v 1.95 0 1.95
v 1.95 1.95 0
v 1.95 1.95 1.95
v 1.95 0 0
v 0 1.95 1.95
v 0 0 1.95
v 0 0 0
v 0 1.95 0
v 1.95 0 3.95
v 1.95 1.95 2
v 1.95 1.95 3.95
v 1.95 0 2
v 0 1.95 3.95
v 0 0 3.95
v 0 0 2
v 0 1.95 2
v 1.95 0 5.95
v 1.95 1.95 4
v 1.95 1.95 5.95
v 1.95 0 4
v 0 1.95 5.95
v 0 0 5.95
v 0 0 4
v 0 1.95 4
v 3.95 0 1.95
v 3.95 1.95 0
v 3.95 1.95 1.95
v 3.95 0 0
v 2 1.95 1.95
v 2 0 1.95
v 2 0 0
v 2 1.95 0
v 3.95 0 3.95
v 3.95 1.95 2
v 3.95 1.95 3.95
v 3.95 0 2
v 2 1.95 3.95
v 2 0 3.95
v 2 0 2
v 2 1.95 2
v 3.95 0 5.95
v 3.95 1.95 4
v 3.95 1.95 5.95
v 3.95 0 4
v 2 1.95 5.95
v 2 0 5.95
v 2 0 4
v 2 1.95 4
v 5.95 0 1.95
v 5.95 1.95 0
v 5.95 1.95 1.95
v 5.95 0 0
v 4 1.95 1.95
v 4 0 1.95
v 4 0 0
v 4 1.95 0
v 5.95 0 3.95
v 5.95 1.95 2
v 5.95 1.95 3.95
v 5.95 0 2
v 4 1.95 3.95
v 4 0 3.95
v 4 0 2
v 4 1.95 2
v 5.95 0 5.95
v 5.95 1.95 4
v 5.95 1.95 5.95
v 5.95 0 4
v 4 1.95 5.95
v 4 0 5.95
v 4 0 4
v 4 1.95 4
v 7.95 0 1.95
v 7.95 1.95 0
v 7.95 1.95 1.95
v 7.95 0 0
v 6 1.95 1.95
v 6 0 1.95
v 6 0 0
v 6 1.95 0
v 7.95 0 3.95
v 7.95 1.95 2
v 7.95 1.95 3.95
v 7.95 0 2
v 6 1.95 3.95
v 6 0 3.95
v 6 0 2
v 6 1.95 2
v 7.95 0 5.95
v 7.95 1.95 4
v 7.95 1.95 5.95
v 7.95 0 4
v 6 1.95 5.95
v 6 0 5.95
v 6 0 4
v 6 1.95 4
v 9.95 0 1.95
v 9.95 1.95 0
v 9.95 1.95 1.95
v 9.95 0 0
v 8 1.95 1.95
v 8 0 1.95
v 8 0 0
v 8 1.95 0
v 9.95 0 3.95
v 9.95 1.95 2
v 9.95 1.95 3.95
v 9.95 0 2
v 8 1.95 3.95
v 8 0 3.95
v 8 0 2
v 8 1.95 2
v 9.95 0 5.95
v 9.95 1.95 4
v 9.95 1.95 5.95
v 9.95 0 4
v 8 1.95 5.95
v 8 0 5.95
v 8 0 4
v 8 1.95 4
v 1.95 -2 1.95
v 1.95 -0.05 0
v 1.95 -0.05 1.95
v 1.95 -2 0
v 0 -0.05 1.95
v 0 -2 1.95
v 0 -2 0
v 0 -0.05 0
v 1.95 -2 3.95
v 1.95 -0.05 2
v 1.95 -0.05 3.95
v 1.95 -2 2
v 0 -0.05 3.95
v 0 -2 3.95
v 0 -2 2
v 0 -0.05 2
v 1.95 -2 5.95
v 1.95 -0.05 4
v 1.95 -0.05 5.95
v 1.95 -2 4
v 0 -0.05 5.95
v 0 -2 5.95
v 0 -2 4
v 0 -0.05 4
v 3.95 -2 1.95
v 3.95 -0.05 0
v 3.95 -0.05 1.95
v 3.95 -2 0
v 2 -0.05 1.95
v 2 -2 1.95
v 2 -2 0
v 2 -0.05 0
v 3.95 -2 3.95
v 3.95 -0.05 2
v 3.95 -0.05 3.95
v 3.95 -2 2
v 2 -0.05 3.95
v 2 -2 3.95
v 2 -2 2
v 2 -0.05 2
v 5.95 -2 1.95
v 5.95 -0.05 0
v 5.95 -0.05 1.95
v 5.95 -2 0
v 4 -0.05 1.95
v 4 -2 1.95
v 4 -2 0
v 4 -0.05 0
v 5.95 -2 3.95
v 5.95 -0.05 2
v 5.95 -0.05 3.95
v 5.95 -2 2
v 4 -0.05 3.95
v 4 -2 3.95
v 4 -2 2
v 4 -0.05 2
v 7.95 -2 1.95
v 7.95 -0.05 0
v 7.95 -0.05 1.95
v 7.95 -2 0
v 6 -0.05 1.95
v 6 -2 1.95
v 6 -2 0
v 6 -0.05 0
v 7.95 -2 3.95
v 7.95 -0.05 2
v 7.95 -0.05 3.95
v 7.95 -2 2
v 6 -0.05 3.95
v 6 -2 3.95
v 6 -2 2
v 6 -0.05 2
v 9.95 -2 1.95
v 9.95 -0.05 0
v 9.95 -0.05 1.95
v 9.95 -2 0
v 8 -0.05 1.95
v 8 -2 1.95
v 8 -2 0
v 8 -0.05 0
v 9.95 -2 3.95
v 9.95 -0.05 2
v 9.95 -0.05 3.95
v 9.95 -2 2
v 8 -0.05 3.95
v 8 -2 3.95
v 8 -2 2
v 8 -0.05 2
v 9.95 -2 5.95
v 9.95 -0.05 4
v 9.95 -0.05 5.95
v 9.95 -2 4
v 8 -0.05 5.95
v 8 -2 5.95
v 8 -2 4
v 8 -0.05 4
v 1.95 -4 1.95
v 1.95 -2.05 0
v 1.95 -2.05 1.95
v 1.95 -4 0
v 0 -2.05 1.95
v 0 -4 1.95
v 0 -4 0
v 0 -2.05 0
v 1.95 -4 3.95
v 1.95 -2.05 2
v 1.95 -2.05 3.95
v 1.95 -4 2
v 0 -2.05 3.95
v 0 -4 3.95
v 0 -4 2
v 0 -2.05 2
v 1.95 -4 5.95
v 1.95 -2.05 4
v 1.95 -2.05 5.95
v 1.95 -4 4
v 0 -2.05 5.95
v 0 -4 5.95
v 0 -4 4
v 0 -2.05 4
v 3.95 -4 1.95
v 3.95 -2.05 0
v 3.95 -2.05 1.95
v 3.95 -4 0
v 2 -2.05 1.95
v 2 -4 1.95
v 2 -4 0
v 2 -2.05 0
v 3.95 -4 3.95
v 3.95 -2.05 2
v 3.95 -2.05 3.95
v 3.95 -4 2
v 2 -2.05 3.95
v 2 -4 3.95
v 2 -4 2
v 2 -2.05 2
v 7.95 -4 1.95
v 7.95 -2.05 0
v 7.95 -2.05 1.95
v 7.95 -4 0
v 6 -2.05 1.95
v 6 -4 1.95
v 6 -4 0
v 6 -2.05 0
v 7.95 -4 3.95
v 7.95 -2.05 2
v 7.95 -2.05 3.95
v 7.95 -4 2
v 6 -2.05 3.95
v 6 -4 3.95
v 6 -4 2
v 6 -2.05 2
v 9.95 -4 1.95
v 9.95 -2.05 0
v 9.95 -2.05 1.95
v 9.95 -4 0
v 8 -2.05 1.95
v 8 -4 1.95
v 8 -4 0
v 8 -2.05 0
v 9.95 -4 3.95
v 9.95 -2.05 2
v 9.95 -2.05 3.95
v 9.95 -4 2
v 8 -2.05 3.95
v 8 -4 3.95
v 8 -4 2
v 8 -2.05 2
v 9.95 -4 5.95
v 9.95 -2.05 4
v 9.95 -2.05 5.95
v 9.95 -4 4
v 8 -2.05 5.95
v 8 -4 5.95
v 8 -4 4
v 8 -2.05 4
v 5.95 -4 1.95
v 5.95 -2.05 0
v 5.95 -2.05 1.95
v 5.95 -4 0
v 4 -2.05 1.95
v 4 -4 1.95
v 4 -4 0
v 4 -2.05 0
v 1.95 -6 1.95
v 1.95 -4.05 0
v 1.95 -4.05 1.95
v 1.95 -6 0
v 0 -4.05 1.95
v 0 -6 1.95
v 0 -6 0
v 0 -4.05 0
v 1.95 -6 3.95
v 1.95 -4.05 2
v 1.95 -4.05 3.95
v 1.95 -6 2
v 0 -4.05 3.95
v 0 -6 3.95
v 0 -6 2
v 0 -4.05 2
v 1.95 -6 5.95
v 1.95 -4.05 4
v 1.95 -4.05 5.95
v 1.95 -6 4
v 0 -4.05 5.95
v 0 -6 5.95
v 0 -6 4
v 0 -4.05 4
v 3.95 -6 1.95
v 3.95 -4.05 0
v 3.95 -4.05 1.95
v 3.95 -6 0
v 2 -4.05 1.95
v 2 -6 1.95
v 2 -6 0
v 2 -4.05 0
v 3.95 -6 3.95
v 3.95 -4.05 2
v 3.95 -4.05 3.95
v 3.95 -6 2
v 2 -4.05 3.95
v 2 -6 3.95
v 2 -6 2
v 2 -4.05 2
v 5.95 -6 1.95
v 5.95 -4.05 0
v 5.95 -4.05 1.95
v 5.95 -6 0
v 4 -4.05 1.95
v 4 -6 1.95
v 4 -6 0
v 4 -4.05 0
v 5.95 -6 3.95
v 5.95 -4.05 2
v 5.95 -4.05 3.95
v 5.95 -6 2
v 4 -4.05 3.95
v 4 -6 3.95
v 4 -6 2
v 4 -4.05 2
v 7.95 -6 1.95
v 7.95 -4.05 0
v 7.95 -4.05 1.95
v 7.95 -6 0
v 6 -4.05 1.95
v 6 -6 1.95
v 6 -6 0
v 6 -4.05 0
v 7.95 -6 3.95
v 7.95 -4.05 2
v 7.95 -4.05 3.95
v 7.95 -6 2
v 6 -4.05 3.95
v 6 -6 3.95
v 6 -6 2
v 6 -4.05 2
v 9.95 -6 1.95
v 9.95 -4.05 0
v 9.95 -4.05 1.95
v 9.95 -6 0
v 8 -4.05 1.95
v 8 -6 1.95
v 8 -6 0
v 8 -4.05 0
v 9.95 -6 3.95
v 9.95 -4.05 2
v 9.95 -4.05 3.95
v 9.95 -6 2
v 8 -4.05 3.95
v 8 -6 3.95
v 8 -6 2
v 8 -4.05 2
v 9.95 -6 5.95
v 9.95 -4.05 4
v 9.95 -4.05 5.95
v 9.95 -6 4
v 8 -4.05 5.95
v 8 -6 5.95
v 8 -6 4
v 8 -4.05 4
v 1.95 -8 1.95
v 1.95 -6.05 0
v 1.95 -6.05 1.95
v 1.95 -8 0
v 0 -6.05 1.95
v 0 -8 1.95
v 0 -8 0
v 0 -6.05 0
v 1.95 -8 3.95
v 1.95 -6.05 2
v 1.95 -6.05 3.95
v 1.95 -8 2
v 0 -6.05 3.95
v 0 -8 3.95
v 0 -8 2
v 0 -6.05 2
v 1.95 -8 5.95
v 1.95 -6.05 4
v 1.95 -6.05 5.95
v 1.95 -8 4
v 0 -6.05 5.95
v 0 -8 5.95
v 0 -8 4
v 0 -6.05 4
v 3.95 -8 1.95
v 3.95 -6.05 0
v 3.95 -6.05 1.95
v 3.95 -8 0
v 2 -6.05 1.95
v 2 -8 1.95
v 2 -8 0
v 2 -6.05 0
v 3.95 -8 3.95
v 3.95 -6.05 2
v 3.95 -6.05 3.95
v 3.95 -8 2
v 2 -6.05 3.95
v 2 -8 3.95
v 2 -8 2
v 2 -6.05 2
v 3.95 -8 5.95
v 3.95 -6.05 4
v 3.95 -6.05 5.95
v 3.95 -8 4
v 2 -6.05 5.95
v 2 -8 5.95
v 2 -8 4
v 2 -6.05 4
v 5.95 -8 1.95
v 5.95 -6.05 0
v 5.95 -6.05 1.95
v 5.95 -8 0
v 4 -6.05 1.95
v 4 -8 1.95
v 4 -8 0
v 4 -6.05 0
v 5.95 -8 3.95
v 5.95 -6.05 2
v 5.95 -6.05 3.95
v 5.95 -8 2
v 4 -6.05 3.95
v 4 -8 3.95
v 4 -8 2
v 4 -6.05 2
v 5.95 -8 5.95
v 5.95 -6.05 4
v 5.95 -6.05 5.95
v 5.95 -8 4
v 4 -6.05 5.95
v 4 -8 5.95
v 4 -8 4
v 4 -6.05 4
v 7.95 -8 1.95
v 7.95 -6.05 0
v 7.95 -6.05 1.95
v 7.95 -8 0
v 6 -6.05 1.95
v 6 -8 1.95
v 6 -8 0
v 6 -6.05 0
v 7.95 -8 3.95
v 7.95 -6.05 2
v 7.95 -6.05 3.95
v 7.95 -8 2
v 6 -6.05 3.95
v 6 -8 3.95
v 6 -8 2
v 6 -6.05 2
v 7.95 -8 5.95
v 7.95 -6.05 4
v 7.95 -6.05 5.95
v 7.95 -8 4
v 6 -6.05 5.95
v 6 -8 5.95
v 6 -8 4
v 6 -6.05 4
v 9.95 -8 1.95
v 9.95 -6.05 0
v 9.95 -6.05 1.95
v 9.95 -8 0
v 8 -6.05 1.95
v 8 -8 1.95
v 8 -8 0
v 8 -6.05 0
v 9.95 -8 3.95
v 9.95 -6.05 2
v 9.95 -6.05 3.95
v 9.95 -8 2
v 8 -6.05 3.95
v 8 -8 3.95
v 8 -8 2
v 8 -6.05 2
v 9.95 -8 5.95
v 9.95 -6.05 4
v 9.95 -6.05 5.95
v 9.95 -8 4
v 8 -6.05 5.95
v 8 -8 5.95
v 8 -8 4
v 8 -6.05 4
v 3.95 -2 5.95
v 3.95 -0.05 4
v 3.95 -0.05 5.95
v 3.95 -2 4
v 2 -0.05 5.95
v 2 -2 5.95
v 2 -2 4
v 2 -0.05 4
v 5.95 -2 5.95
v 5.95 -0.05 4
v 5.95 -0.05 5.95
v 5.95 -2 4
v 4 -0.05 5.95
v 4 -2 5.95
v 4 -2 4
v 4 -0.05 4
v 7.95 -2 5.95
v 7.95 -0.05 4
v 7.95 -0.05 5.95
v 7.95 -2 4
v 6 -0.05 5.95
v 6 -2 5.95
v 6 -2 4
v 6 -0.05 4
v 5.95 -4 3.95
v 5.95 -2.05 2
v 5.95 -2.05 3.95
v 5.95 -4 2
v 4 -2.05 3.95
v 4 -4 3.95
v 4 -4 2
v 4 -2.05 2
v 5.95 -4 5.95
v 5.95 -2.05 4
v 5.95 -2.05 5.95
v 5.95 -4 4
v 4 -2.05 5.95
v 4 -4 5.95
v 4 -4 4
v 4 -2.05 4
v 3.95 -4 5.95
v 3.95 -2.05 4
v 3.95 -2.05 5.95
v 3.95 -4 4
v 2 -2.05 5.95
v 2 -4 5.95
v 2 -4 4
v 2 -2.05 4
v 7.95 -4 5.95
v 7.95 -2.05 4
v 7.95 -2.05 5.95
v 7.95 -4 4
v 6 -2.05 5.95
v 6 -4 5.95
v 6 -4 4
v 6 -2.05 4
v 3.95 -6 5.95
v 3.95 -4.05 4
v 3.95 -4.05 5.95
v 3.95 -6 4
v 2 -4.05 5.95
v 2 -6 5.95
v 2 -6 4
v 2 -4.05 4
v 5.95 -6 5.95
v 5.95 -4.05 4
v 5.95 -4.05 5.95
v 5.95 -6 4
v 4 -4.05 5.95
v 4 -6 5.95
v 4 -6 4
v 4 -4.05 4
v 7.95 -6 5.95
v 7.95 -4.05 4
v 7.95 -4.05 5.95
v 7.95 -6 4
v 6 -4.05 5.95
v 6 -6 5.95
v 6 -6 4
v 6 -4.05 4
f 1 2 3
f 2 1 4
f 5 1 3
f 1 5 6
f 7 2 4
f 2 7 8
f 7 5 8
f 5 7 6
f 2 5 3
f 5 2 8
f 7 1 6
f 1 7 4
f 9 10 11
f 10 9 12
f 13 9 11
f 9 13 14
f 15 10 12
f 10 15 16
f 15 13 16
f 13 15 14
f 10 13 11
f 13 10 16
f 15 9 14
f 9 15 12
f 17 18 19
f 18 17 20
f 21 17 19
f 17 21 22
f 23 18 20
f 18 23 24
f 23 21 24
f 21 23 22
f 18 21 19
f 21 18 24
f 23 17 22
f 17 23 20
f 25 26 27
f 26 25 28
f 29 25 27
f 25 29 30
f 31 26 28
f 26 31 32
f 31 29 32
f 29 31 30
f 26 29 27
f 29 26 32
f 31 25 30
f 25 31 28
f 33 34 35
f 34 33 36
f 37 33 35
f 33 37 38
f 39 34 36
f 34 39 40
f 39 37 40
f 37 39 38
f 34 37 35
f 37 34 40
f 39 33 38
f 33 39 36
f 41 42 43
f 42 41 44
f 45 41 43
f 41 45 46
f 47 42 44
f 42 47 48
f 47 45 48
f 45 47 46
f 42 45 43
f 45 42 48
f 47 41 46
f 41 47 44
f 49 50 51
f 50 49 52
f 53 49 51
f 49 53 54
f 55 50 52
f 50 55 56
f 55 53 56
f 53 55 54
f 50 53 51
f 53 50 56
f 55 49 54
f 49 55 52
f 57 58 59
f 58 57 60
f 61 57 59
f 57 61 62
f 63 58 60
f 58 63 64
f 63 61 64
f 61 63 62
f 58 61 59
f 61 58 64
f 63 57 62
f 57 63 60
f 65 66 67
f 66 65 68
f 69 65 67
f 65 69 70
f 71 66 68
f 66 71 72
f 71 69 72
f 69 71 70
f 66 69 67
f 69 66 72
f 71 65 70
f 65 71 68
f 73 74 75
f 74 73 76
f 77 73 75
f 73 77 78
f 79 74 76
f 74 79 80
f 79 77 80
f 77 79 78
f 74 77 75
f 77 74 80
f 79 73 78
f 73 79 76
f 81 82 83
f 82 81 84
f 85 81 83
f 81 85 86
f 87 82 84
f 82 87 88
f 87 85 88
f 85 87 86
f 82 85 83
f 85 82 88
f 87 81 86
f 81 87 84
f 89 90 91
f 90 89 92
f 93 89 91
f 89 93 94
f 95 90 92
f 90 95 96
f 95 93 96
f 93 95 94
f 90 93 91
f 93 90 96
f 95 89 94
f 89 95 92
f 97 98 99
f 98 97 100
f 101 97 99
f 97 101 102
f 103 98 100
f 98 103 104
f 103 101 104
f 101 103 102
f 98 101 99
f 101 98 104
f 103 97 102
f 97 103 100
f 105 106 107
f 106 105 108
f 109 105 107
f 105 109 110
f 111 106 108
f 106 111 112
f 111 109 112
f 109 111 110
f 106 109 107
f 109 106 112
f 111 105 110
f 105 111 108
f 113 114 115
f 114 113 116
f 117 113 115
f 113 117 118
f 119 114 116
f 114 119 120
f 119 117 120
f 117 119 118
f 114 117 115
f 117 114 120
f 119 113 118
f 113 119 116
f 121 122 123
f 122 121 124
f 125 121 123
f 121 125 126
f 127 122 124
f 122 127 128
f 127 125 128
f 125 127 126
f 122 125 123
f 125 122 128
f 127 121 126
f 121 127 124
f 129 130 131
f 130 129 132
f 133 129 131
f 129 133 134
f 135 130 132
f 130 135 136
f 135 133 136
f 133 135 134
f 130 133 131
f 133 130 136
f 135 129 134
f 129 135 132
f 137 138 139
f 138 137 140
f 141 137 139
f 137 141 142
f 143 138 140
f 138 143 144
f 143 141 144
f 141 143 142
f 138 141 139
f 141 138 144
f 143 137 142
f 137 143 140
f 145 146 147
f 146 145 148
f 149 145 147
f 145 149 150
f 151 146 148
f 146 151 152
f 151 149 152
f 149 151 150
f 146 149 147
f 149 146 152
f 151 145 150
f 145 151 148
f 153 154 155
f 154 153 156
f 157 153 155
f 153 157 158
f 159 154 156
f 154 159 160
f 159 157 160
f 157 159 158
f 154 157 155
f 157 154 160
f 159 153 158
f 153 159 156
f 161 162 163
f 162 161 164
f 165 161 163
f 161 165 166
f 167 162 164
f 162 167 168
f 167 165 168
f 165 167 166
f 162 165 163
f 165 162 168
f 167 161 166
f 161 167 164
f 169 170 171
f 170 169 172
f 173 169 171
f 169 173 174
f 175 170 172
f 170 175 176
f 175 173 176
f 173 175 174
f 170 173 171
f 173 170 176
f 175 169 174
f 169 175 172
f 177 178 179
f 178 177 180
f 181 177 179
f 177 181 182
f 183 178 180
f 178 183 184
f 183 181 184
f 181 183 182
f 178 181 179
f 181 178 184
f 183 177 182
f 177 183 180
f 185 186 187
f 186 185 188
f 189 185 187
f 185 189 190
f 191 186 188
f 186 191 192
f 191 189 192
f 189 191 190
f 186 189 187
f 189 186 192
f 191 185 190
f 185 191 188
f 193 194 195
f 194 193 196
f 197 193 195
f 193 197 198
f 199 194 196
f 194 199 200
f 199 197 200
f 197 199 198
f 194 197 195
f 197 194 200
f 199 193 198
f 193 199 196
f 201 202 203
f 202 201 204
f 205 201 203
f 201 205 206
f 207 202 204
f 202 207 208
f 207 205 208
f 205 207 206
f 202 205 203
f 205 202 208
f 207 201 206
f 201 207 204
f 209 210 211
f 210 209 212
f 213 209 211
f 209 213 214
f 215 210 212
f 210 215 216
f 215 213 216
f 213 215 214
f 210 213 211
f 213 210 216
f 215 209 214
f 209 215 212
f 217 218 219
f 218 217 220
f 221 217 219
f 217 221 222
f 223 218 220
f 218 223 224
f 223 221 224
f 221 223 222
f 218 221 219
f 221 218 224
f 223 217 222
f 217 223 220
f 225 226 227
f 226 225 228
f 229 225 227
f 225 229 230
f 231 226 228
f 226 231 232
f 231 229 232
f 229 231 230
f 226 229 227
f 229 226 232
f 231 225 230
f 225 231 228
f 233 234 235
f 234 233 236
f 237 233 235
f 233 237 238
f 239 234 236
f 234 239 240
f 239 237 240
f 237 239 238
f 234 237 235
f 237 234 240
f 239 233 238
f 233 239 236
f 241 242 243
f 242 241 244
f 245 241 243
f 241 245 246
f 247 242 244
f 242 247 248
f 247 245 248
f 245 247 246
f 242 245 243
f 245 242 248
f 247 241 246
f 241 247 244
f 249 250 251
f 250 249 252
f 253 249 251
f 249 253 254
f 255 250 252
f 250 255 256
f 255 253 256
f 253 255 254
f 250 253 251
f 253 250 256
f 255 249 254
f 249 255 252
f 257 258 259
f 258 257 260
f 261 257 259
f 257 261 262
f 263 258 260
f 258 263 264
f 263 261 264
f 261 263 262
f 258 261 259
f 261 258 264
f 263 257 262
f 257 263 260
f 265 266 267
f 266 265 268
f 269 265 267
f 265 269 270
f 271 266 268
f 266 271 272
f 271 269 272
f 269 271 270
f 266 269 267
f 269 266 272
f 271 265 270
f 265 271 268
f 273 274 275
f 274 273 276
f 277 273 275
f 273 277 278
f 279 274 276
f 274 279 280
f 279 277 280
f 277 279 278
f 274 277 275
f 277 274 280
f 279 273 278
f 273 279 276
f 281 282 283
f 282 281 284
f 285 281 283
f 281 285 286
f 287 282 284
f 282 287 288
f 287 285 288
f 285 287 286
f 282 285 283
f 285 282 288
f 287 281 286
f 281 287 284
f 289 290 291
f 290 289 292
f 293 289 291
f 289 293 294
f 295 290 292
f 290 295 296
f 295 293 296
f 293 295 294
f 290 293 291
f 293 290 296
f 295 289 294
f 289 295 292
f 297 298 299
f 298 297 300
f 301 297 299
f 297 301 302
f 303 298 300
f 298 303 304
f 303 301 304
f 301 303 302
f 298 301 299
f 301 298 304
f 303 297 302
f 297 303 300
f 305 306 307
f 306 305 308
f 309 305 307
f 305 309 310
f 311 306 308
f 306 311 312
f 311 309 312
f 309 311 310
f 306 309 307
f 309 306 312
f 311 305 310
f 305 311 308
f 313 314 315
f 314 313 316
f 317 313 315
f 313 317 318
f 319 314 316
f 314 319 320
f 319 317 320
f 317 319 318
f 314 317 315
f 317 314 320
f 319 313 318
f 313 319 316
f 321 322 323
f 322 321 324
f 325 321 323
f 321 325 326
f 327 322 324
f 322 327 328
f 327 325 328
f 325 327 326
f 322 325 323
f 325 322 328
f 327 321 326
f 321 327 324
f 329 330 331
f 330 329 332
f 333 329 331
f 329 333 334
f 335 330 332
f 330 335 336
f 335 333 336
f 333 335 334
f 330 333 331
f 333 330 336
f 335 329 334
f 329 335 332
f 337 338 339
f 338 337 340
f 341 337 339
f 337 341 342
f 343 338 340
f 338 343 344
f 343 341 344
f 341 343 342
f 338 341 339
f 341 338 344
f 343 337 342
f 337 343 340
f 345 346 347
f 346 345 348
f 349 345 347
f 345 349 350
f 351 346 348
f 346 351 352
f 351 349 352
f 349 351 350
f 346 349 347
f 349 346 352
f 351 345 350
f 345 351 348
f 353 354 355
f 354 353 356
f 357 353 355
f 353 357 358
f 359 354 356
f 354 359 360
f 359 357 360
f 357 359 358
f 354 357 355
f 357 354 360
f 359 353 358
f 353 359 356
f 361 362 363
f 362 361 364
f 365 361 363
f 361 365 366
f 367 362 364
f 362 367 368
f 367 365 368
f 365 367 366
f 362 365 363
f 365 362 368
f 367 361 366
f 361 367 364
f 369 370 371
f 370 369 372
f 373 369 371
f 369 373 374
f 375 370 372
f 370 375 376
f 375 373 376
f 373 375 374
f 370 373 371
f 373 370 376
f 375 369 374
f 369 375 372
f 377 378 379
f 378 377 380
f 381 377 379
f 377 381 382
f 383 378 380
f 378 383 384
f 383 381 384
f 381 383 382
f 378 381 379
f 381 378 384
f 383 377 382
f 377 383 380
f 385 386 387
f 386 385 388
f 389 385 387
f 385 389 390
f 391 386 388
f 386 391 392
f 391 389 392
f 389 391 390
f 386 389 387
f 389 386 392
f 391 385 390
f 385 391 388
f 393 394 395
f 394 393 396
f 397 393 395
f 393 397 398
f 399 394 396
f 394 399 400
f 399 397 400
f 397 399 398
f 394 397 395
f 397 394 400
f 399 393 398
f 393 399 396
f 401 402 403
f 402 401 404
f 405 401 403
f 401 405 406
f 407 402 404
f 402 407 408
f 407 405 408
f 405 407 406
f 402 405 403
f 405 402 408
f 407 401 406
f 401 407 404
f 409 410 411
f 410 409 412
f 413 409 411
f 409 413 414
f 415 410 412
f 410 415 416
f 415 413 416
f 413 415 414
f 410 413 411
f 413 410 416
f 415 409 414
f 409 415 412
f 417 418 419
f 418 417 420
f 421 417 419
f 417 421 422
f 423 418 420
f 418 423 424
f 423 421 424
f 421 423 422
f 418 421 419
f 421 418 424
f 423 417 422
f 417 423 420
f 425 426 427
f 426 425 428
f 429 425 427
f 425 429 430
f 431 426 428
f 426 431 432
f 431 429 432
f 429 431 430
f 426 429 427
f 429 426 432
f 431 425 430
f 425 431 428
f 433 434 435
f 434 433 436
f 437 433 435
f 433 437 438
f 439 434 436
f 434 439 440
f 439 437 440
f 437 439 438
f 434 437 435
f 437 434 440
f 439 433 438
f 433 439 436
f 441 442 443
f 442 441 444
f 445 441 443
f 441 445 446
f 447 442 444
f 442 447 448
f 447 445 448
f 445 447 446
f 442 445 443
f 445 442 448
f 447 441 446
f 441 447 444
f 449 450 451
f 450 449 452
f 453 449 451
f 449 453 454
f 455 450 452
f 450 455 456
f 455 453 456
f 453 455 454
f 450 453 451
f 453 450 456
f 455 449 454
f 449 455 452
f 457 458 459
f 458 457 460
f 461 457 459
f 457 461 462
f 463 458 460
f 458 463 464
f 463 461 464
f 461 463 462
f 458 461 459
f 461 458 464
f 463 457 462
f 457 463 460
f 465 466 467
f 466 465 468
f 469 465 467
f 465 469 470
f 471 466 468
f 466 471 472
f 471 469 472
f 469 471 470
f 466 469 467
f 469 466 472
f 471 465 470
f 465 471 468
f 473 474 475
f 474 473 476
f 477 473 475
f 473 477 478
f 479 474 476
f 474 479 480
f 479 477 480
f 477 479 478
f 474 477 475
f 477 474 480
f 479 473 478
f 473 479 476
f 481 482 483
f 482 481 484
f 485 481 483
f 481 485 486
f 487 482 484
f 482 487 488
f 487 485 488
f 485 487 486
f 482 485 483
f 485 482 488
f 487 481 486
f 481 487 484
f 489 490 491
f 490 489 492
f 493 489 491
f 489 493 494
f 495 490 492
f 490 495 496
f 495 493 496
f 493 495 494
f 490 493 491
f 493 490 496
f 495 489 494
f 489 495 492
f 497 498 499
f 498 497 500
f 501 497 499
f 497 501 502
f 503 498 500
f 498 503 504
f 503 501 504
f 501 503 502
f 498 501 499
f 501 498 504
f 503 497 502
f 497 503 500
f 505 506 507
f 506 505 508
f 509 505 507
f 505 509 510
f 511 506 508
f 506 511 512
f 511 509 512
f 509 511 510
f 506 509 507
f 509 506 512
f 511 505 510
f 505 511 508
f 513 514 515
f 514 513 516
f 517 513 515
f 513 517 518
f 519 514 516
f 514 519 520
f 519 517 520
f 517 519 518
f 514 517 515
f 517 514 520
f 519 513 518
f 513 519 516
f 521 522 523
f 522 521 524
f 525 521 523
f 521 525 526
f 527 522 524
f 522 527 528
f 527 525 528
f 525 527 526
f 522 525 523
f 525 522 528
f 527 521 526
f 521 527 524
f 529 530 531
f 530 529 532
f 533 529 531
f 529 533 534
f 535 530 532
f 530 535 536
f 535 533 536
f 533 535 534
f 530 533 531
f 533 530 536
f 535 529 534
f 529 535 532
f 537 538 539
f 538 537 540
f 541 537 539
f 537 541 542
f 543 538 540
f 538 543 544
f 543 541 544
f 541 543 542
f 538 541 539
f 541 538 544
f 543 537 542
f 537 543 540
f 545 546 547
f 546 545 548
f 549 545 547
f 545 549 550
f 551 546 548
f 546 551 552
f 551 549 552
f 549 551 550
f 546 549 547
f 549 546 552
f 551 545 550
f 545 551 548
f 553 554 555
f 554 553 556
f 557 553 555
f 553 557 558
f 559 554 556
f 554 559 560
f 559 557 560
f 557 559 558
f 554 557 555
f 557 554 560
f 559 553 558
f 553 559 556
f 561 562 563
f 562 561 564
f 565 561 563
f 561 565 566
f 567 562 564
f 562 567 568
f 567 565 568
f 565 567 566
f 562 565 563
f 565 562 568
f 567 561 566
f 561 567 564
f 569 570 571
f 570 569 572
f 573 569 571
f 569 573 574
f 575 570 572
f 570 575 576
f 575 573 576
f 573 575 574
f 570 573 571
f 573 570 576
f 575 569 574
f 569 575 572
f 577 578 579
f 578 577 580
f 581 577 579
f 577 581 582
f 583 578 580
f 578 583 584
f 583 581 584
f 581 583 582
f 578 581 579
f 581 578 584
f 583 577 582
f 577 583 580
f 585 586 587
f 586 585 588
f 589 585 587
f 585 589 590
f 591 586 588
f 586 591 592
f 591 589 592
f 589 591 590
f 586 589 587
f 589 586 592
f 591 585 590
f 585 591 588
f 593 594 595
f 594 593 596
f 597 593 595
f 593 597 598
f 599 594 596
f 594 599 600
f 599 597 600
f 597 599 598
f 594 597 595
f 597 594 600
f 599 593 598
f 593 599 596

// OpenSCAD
m = [[3, 3, 3, 3, 3],
     [3, 2, 2, 2, 3],
     [3, 2, 1, 2, 3],
     [3, 2, 2, 2, 3],
     [3, 3, 3, 3, 3]];
     
w = [[0, 0, 0, 0, 0],
     [0, 1, 1, 1, 0],
     [0, 1, 2, 1, 0],
     [0, 1, 1, 1, 0],
     [0, 0, 0, 0, 0]];

module sugar(x,y,h)
{
  for (i = [0: h-1]) {
    translate([2*x, -2*y, 2*i])
    color([1,1,1])
    cube(1.95);
  };   
};

module water(x,y,h)
{
  if (h>0) {
    for (i = [0: h-1]) {
      translate([2*x, -2*y, 2*m[y][x] + 2*i])
      color([0.1,0.1,0.7,0.3])
      cube(1.95);
    };   
  };
};

for ( y = [0:5]) {
    for ( x = [0:5]) {
        sugar(x,y, m[y][x]);
    };
};
for ( y = [0:5]) {
    for ( x = [0:5]) {
        water(x,y, w[y][x]);
    };
};    
